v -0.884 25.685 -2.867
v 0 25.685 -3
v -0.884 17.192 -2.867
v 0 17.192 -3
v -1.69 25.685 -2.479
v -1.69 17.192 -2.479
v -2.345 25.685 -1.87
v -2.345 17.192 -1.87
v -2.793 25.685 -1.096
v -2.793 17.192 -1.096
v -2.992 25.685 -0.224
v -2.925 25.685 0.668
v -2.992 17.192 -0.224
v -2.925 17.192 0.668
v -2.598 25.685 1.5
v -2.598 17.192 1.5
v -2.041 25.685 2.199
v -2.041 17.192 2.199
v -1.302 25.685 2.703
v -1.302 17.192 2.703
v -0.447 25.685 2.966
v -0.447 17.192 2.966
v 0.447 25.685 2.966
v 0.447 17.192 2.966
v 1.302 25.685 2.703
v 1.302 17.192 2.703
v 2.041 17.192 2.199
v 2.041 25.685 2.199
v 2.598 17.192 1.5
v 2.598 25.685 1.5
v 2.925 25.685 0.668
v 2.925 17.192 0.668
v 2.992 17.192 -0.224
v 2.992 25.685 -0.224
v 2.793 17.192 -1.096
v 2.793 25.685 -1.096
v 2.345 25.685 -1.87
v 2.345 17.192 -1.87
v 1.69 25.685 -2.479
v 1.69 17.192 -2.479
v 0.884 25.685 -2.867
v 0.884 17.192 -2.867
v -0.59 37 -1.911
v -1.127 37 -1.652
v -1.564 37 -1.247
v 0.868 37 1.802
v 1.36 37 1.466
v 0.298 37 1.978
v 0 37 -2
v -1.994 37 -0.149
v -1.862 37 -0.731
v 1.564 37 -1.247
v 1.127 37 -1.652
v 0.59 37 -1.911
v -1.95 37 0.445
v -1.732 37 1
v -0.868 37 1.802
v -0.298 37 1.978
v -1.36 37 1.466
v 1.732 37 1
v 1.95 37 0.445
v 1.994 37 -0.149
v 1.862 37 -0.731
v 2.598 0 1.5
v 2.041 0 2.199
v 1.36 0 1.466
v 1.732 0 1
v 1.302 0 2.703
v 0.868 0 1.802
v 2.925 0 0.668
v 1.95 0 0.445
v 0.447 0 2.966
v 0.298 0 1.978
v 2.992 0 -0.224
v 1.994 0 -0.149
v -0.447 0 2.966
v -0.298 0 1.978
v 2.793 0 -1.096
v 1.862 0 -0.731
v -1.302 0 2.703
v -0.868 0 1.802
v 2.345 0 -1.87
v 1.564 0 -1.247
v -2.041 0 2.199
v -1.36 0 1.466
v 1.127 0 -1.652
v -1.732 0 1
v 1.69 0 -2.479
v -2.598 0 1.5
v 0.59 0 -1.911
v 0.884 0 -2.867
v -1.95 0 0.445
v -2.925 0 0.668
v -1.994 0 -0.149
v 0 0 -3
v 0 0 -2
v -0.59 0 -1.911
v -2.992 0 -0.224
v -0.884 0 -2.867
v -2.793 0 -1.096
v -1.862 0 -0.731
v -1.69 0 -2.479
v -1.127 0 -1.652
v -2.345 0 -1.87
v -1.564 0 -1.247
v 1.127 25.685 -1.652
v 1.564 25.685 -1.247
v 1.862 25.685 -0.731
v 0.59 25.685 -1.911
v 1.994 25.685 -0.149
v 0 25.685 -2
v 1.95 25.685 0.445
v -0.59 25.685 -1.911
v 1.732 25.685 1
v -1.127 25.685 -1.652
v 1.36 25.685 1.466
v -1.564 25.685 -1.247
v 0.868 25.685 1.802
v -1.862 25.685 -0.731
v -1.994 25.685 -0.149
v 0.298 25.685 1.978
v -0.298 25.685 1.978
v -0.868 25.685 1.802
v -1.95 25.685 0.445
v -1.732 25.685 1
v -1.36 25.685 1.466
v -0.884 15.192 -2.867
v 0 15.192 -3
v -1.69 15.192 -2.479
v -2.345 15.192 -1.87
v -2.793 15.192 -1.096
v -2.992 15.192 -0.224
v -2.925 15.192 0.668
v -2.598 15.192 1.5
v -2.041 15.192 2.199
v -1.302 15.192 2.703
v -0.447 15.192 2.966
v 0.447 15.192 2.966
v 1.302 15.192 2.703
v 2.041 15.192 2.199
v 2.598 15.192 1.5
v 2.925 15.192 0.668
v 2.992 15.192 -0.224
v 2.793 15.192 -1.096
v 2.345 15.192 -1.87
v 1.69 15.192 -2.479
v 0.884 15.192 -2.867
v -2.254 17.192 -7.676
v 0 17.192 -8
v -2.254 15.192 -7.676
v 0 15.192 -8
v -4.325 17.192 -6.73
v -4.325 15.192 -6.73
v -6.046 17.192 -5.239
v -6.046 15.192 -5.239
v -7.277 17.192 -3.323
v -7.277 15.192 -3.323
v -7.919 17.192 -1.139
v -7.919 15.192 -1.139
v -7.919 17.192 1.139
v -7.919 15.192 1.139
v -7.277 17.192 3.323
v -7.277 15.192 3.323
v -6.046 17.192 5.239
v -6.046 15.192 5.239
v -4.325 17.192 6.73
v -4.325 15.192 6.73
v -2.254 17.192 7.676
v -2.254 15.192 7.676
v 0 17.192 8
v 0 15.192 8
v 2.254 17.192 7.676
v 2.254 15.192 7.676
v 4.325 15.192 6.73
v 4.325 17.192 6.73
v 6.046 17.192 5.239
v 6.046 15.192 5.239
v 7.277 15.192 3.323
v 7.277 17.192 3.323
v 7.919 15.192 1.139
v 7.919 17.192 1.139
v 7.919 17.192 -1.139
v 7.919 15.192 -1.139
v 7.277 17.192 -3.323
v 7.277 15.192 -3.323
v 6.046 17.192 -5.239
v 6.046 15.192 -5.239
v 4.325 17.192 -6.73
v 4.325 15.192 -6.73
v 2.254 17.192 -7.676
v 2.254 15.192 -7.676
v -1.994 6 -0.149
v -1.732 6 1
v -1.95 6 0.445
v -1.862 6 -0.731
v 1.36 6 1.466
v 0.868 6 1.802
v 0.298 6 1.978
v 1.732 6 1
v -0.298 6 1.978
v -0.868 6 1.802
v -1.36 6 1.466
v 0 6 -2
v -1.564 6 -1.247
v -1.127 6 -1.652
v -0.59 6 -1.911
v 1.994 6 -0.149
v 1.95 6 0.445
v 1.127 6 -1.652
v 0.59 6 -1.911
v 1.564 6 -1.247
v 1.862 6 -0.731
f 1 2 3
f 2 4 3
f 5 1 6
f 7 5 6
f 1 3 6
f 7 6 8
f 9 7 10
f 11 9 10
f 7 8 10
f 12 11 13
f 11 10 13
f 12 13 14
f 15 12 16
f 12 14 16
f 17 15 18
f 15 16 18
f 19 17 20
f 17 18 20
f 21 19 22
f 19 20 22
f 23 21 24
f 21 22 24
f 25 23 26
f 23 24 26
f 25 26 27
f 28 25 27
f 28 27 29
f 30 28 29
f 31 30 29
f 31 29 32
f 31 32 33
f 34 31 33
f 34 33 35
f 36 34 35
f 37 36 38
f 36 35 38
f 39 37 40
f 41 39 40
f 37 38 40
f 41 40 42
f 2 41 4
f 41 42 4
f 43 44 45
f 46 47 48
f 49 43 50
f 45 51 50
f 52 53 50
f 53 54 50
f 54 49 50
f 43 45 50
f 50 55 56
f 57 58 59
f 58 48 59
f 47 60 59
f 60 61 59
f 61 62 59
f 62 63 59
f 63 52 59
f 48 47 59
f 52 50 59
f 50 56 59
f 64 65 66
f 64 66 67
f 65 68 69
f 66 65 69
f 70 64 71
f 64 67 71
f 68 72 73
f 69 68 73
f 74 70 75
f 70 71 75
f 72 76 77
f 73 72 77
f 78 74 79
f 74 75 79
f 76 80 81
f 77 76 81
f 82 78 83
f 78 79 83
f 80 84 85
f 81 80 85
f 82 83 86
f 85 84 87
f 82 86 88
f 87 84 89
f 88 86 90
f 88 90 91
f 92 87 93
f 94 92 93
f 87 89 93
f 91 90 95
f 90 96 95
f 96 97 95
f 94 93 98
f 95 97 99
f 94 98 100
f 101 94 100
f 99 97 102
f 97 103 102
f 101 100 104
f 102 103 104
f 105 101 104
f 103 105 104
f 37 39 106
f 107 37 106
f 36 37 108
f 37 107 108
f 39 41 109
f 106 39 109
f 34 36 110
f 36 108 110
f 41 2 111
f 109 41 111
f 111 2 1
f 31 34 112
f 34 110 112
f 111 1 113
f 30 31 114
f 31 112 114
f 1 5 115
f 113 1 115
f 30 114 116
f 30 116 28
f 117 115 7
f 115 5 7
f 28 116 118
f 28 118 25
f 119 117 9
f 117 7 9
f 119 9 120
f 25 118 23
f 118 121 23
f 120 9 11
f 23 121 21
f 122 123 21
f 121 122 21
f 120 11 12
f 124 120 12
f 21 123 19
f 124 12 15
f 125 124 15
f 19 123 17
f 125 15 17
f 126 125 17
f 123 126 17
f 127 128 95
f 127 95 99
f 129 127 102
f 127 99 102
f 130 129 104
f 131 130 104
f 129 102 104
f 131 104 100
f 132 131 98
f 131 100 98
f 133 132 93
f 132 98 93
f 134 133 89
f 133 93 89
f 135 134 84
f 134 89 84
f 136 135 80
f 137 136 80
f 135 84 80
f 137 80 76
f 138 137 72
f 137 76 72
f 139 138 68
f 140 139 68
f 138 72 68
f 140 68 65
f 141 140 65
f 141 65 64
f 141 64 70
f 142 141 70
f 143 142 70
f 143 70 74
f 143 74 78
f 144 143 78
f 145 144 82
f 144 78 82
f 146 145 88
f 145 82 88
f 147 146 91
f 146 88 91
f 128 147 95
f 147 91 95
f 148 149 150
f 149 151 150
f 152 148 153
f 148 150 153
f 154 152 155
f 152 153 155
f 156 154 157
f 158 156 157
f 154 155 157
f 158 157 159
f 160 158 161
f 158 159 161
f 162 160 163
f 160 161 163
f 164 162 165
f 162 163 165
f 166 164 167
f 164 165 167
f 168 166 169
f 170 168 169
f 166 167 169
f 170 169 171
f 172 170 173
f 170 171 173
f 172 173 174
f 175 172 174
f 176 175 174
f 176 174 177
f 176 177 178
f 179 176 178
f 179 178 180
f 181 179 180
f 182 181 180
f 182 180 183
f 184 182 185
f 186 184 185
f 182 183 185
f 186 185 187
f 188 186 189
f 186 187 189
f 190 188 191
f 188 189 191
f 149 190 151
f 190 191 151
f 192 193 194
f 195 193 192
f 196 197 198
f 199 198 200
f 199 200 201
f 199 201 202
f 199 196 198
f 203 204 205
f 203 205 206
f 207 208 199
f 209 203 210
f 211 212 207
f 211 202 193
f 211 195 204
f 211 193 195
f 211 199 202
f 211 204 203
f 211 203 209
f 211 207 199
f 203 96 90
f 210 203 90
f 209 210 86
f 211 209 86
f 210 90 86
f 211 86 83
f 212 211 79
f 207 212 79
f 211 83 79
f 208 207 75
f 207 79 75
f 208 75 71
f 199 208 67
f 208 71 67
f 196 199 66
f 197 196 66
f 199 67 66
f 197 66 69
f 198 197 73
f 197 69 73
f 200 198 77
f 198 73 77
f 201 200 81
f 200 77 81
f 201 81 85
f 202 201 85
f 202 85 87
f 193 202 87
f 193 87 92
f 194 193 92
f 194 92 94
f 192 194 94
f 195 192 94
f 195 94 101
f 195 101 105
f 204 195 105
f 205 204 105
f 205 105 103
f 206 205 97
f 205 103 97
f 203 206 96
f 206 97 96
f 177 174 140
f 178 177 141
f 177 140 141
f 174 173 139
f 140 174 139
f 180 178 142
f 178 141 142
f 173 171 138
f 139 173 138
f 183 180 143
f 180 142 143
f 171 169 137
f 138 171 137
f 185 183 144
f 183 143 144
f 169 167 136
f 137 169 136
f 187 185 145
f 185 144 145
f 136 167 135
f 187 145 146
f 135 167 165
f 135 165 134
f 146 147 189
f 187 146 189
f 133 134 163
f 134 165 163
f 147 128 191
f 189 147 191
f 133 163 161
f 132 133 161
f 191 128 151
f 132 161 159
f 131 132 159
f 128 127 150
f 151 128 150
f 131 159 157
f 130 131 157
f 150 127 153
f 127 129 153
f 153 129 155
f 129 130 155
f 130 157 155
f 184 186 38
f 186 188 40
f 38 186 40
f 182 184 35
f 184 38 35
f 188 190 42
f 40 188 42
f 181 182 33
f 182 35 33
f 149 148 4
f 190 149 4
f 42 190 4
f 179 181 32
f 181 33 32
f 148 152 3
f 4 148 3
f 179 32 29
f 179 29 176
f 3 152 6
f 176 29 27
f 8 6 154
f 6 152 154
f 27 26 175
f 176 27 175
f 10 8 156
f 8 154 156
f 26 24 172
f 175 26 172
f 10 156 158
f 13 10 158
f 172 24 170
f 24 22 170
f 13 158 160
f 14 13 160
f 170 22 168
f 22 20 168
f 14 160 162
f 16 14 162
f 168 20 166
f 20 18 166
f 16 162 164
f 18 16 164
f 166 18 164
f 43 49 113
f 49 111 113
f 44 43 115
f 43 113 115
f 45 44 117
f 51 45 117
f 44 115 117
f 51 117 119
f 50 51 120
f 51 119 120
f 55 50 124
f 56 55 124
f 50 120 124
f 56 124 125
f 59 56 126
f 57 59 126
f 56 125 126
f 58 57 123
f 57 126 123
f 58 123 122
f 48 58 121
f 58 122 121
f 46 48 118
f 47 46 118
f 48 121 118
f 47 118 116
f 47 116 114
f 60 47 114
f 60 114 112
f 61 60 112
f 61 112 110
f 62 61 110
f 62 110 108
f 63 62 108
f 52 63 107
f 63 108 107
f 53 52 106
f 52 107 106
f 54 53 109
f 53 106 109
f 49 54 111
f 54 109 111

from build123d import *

# Parameters (mm, degrees)
SKETCH2_R          = 2
CUT_EXTRUDE1_DEPTH = 6


with BuildPart() as part:
    # Sketch1 → Revolve1 (revolve)
    with BuildSketch(Plane.XY, mode=Mode.PRIVATE) as revolve1_sk:
        Polygon((0, 0), (0, 37), (2, 37), (2, 25.684518386), (3, 25.684518386), (3, 17.191909634), (8, 17.191909634), (8, 15.191909634), (3, 15.191909634), (3, 0), align=None)
    revolve(revolve1_sk.sketch.rotate(Axis((0, 0, 0), (0, 1, 0)), 90), axis=Axis((0, 0, 0), (0, 1, 0)))

    # Sketch2 → Cut-Extrude1 (cut)
    with BuildSketch(Plane.XZ):
        with Locations(Location((0, 0, 0), (0, 0, 270))):
            Circle(SKETCH2_R)
    extrude(amount=-CUT_EXTRUDE1_DEPTH, mode=Mode.SUBTRACT)


solid = part.part
